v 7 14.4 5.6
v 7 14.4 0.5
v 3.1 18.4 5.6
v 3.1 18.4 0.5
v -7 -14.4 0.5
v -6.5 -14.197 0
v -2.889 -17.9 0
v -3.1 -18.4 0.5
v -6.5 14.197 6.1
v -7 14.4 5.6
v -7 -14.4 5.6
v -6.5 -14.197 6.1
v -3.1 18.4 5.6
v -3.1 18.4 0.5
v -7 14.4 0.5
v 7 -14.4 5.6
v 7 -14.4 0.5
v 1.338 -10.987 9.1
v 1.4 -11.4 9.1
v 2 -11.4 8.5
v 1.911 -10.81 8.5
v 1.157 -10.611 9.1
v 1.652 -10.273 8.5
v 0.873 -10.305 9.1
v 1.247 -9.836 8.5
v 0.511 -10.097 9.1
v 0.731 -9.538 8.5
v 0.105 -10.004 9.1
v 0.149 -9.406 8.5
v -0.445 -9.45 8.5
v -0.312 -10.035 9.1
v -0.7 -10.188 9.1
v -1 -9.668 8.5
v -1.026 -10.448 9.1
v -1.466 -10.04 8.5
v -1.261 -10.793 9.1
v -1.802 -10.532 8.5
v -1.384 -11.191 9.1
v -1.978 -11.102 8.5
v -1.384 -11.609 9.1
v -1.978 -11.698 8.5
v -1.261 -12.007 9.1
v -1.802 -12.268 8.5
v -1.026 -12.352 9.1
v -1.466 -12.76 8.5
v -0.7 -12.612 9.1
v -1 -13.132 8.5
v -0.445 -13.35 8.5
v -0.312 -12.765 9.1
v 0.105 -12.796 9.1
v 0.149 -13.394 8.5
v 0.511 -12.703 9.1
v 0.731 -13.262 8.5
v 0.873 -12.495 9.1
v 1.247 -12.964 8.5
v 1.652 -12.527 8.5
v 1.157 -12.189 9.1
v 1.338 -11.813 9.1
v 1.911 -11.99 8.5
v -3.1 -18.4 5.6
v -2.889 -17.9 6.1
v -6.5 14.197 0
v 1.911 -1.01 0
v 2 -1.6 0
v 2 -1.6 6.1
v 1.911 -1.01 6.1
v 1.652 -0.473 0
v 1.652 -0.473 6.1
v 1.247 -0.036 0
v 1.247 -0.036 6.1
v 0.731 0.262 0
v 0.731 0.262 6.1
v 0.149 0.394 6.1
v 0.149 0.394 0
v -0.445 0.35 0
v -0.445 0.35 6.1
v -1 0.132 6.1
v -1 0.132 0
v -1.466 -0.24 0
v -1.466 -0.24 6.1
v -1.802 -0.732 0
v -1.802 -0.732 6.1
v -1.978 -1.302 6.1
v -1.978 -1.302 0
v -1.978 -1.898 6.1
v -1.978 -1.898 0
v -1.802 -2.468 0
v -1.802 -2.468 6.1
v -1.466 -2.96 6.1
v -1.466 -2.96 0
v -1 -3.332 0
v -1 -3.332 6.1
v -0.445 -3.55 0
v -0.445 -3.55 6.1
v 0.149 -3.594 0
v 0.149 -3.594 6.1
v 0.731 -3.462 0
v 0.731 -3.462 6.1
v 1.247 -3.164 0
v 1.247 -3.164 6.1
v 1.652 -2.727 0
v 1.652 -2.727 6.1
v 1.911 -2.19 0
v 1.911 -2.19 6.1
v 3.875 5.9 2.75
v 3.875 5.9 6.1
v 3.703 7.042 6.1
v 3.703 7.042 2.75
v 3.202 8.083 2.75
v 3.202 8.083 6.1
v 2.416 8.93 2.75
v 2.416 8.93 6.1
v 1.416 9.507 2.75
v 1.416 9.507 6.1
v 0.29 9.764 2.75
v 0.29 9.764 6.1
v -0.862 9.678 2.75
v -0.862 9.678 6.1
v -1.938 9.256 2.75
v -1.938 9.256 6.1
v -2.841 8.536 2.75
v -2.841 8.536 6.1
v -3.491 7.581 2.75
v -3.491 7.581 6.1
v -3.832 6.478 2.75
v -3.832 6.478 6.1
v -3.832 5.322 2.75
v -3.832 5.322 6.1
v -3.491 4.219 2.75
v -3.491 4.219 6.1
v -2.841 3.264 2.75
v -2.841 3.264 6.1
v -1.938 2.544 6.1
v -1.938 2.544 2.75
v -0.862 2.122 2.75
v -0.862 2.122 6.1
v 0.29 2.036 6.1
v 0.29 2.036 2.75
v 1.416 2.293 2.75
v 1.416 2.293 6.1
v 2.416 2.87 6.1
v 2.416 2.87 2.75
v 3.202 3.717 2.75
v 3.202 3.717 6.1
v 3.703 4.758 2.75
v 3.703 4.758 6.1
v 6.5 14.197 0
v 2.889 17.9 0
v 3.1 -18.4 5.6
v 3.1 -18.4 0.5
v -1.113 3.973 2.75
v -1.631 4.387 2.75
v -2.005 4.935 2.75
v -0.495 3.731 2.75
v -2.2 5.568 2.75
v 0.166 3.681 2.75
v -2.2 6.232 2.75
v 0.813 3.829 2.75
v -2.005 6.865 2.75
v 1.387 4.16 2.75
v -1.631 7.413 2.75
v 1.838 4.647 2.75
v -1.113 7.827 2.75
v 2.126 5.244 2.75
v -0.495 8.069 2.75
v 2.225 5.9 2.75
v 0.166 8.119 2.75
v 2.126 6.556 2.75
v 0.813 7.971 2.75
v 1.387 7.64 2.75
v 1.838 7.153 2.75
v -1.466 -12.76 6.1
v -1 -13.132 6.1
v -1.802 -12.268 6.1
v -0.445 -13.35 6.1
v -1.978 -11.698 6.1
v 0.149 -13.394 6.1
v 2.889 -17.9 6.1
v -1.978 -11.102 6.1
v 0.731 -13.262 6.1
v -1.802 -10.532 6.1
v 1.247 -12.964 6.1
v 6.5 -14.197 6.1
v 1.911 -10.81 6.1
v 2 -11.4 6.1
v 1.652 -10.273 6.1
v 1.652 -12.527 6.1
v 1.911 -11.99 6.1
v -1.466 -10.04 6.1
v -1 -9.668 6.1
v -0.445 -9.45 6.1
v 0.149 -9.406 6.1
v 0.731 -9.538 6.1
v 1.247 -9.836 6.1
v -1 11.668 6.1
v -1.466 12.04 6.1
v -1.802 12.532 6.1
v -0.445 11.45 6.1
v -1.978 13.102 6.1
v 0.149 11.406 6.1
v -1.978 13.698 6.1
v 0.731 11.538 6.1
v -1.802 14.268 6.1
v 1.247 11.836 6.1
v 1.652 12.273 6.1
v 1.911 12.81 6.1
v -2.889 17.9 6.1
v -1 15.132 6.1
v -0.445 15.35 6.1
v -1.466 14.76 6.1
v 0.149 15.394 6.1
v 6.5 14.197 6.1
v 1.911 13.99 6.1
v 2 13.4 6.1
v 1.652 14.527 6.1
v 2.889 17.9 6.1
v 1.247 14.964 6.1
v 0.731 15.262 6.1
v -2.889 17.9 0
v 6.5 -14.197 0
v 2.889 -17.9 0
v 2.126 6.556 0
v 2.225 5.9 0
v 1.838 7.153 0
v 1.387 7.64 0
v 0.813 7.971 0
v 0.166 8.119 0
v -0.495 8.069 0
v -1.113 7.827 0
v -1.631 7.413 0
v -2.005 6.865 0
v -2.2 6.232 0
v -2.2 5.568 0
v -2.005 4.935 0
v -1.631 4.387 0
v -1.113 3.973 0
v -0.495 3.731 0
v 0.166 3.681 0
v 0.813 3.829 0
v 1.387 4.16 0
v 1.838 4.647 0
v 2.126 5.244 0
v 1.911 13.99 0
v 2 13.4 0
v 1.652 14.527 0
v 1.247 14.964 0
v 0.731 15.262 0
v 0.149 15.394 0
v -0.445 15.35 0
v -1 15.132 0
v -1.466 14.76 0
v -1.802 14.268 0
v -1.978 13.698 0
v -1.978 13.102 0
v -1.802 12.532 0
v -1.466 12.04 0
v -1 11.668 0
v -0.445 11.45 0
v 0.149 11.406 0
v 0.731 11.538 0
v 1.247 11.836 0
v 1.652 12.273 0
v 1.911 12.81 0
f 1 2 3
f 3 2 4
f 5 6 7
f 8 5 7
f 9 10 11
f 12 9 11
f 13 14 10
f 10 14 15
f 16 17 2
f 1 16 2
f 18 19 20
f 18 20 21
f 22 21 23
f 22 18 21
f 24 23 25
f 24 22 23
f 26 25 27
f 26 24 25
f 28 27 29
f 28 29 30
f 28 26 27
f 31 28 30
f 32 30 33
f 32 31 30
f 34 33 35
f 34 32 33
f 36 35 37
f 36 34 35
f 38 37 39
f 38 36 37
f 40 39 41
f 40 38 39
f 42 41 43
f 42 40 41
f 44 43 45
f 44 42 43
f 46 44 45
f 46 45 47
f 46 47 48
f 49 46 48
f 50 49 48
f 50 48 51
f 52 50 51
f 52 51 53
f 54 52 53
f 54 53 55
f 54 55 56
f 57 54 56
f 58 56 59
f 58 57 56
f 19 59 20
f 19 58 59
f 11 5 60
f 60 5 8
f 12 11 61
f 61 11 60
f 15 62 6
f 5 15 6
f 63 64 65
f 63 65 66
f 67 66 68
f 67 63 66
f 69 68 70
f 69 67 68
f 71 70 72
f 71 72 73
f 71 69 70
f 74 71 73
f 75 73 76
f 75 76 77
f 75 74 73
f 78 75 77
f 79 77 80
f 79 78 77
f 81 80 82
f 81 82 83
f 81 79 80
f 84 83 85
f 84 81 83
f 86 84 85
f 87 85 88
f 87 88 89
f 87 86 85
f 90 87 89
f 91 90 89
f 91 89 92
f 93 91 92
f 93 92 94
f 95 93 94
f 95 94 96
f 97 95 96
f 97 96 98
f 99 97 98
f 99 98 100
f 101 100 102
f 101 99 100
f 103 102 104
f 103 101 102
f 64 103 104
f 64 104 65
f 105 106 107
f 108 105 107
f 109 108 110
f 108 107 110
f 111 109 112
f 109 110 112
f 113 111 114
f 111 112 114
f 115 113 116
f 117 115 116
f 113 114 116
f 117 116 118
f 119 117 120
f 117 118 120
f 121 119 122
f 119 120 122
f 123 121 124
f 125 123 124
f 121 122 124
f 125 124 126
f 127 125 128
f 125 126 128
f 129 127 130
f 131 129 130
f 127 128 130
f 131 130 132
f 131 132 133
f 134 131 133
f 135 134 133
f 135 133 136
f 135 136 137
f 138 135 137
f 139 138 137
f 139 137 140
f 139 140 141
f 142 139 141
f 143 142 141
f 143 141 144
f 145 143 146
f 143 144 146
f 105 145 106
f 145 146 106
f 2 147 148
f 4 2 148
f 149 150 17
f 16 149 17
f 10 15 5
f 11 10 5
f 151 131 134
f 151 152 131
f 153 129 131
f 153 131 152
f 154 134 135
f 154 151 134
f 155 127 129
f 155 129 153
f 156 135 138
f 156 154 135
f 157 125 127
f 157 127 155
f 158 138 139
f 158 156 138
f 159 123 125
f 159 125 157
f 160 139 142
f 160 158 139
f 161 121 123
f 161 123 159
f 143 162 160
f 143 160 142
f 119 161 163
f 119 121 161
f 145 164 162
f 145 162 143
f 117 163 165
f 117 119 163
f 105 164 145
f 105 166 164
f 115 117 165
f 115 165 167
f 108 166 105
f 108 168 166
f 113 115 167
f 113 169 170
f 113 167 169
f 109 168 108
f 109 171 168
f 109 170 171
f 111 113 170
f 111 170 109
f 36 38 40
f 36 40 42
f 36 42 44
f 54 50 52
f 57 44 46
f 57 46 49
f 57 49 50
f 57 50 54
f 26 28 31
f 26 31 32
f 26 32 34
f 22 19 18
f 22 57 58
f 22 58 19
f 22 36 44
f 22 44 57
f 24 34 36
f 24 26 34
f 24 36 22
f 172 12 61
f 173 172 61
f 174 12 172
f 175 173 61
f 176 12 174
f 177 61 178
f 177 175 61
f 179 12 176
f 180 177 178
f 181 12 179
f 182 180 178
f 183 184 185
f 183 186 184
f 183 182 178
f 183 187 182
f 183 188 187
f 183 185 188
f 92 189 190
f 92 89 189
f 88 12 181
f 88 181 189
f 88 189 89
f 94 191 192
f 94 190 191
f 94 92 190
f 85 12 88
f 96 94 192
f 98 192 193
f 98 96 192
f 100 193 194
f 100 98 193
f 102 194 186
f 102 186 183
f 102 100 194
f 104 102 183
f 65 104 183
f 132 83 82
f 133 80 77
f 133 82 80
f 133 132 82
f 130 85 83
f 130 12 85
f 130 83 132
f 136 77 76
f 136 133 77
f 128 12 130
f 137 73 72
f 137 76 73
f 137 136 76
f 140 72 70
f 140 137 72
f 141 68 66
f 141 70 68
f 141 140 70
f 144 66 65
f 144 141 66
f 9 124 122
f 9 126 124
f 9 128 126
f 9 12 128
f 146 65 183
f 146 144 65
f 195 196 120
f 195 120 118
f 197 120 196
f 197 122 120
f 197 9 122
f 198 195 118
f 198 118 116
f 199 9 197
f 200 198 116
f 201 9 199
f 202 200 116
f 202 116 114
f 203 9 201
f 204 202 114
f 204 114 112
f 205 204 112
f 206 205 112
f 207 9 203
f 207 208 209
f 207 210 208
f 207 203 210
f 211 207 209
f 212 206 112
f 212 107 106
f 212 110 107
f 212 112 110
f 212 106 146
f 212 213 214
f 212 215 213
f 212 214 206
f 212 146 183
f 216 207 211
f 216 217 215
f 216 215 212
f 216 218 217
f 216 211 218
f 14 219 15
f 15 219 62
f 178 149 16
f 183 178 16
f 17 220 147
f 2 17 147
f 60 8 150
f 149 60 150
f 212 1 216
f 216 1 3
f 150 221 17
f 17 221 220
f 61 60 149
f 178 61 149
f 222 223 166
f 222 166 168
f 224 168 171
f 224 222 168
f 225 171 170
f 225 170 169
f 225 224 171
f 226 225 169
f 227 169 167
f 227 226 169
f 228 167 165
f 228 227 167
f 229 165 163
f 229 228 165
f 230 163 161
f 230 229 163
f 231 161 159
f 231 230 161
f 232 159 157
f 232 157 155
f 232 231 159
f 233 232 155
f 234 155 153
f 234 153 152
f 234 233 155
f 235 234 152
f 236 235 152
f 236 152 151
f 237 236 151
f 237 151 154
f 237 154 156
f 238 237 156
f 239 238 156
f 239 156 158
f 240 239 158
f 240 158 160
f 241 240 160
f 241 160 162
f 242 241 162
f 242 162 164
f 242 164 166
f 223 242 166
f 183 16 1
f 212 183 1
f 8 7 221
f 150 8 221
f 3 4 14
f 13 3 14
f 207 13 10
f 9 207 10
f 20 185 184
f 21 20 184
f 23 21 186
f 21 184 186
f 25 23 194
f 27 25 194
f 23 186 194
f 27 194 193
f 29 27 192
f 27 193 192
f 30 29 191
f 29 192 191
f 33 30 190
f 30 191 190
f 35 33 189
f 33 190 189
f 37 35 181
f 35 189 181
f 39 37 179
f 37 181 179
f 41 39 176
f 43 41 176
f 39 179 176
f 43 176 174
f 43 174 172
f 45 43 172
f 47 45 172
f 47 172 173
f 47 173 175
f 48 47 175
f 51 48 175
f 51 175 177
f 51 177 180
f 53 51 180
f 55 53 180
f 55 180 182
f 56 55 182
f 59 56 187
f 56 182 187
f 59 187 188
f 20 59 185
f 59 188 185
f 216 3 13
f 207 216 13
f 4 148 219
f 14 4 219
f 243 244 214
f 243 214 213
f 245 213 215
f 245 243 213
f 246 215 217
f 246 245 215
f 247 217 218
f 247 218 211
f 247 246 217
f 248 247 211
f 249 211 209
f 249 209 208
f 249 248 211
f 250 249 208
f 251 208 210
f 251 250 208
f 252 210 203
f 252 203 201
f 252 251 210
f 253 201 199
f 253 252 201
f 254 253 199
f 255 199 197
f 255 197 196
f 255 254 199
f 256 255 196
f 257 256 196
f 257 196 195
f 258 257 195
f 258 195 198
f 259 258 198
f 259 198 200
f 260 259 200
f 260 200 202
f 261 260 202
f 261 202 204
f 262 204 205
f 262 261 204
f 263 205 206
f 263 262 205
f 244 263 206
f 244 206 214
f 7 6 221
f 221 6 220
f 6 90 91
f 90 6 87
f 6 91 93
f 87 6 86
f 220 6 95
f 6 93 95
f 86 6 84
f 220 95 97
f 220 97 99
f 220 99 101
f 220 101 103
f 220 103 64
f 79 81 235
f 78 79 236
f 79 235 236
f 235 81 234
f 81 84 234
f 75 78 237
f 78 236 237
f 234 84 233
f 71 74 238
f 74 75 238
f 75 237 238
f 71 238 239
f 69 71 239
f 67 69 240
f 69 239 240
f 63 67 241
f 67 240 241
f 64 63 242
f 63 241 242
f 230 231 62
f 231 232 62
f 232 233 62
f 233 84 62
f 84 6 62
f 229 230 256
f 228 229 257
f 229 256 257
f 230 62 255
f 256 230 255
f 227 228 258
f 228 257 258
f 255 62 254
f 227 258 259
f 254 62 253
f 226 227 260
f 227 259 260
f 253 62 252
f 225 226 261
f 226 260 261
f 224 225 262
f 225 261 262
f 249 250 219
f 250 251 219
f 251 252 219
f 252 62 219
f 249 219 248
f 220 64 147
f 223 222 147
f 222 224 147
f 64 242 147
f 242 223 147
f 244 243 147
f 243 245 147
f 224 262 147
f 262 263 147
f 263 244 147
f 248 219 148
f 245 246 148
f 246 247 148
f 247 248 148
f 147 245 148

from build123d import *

# Parameters (mm, degrees)
F0_R     = 2
F0_R_2   = 2.225
F1_DEPTH = 6.1
F2_R     = 3.875
F2_R_2   = 2.225
F3_DEPTH = 3.35
F4_R     = 2
F5_DEPTH = 3
F6_SIZE  = 0.6
F7_SIZE  = 0.5


with BuildPart() as f1:
    # F0 (on Top) → F1 (new body)
    with BuildSketch(Plane.XY):
        Polygon((-7, 14.4), (-7, 0), (-7, -14.4), (-3.1, -18.4), (0, -18.4), (3.1, -18.4), (7, -14.4), (7, 0), (7, 14.4), (3.1, 18.4), (0, 18.4), (-3.1, 18.4), align=None)
        with Locations((0, -1.6)):
            Circle(F0_R, mode=Mode.SUBTRACT)
        with Locations((0, 5.9)):
            Circle(F0_R_2, mode=Mode.SUBTRACT)
        with Locations((0, 13.4)):
            Circle(F0_R, mode=Mode.SUBTRACT)
    extrude(amount=F1_DEPTH)

    # F2 (on face) → F3 (cut)
    with BuildSketch(Plane.XY.offset(6.1)):
        with Locations((0, 5.9)):
            Circle(F2_R)
        with Locations((0, 5.9)):
            Circle(F2_R_2, mode=Mode.SUBTRACT)
    extrude(amount=-F3_DEPTH, mode=Mode.SUBTRACT)

    # F4 (on face) → F5 (join)
    with BuildSketch(Plane.XY.offset(6.1)):
        with Locations((0, -11.4)):
            Circle(F4_R)
    extrude(amount=F5_DEPTH)

    # F6
    f6_edges = [f1.edges().sort_by_distance(p)[0] for p in [
        (-2, -11.4, 9.1),
    ]]
    chamfer(f6_edges, length=F6_SIZE)

    # F7
    f7_edges = [f1.edges().sort_by_distance(p)[0] for p in [
        (-7, 0, 0),
        (-5.05, -16.4, 0),
        (0, -18.4, 0),
        (5.05, -16.4, 0),
        (7, 0, 0),
        (5.05, 16.4, 0),
        (0, 18.4, 0),
        (-5.05, 16.4, 0),
        (5.05, -16.4, 6.1),
        (0, -18.4, 6.1),
        (-5.05, -16.4, 6.1),
        (-7, 0, 6.1),
        (-5.05, 16.4, 6.1),
        (0, 18.4, 6.1),
        (5.05, 16.4, 6.1),
        (7, 0, 6.1),
    ]]
    chamfer(f7_edges, length=F7_SIZE)


solid = f1.part
